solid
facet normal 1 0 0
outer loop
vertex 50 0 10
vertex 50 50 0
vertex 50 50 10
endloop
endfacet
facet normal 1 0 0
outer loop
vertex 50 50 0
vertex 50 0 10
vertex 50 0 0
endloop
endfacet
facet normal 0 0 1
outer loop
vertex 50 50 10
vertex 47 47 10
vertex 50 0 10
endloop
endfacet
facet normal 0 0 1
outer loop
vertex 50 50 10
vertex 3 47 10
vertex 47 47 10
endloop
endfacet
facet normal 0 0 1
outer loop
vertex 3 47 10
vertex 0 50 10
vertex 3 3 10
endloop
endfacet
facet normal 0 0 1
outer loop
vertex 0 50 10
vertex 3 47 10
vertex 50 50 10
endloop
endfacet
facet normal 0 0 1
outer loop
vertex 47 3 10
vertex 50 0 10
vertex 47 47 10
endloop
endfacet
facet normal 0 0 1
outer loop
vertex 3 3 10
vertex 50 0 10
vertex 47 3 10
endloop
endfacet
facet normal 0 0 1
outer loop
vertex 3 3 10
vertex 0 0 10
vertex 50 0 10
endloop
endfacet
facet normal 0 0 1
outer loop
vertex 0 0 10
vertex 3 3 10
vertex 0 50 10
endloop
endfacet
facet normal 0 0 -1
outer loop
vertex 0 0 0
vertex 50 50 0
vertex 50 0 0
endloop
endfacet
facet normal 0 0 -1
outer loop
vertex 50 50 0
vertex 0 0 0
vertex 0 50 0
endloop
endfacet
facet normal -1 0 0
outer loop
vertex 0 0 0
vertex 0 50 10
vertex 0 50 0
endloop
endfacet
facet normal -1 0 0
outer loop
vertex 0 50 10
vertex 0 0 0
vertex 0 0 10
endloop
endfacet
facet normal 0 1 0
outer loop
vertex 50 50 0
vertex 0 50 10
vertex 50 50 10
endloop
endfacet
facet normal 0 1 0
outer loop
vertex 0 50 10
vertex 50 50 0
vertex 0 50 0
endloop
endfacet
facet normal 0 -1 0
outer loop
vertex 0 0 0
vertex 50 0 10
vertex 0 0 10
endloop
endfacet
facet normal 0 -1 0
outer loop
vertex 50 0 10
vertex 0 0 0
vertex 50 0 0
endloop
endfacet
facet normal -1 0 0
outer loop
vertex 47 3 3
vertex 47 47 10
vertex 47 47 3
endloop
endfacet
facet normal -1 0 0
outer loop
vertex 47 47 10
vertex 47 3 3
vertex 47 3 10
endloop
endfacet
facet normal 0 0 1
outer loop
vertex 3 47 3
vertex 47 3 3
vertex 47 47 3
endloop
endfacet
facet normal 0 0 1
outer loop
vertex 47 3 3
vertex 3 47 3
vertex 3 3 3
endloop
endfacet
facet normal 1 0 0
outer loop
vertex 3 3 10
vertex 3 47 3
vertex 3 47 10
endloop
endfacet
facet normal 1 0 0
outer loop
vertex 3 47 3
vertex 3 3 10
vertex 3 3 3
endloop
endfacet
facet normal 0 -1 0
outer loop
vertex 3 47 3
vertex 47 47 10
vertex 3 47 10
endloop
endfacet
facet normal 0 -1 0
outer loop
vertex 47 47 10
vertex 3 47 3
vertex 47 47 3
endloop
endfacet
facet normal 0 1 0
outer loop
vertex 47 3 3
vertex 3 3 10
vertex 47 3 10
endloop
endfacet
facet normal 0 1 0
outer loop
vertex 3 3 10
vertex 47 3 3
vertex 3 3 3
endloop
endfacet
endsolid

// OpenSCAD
// Generated by HEIDI for job job_1787766307246_087b3f82
// Product: 3D-Printable Model Preparation Package
// Request: Failure injection test
// Model type: box
// Generated: 2026-09-07T04:35:15.229Z
//
// This is a parameterized OpenSCAD model. You can adjust the
// parameters below to customize the dimensions before rendering.

// ─── Parameters ───
width = 50;       // X dimension in mm
height = 50;     // Y dimension in mm
depth = 10;       // Z dimension in mm
wall = 3;    // wall thickness in mm
$fn = 60;               // facet resolution

// Parametric hollow box
module parametric_box() {
    difference() {
        // Outer shell
        cube([width, height, depth]);
        // Inner cavity
        translate([wall, wall, wall])
            cube([width - wall * 2, height - wall * 2, depth - wall + 1]);
    }
}
parametric_box();
